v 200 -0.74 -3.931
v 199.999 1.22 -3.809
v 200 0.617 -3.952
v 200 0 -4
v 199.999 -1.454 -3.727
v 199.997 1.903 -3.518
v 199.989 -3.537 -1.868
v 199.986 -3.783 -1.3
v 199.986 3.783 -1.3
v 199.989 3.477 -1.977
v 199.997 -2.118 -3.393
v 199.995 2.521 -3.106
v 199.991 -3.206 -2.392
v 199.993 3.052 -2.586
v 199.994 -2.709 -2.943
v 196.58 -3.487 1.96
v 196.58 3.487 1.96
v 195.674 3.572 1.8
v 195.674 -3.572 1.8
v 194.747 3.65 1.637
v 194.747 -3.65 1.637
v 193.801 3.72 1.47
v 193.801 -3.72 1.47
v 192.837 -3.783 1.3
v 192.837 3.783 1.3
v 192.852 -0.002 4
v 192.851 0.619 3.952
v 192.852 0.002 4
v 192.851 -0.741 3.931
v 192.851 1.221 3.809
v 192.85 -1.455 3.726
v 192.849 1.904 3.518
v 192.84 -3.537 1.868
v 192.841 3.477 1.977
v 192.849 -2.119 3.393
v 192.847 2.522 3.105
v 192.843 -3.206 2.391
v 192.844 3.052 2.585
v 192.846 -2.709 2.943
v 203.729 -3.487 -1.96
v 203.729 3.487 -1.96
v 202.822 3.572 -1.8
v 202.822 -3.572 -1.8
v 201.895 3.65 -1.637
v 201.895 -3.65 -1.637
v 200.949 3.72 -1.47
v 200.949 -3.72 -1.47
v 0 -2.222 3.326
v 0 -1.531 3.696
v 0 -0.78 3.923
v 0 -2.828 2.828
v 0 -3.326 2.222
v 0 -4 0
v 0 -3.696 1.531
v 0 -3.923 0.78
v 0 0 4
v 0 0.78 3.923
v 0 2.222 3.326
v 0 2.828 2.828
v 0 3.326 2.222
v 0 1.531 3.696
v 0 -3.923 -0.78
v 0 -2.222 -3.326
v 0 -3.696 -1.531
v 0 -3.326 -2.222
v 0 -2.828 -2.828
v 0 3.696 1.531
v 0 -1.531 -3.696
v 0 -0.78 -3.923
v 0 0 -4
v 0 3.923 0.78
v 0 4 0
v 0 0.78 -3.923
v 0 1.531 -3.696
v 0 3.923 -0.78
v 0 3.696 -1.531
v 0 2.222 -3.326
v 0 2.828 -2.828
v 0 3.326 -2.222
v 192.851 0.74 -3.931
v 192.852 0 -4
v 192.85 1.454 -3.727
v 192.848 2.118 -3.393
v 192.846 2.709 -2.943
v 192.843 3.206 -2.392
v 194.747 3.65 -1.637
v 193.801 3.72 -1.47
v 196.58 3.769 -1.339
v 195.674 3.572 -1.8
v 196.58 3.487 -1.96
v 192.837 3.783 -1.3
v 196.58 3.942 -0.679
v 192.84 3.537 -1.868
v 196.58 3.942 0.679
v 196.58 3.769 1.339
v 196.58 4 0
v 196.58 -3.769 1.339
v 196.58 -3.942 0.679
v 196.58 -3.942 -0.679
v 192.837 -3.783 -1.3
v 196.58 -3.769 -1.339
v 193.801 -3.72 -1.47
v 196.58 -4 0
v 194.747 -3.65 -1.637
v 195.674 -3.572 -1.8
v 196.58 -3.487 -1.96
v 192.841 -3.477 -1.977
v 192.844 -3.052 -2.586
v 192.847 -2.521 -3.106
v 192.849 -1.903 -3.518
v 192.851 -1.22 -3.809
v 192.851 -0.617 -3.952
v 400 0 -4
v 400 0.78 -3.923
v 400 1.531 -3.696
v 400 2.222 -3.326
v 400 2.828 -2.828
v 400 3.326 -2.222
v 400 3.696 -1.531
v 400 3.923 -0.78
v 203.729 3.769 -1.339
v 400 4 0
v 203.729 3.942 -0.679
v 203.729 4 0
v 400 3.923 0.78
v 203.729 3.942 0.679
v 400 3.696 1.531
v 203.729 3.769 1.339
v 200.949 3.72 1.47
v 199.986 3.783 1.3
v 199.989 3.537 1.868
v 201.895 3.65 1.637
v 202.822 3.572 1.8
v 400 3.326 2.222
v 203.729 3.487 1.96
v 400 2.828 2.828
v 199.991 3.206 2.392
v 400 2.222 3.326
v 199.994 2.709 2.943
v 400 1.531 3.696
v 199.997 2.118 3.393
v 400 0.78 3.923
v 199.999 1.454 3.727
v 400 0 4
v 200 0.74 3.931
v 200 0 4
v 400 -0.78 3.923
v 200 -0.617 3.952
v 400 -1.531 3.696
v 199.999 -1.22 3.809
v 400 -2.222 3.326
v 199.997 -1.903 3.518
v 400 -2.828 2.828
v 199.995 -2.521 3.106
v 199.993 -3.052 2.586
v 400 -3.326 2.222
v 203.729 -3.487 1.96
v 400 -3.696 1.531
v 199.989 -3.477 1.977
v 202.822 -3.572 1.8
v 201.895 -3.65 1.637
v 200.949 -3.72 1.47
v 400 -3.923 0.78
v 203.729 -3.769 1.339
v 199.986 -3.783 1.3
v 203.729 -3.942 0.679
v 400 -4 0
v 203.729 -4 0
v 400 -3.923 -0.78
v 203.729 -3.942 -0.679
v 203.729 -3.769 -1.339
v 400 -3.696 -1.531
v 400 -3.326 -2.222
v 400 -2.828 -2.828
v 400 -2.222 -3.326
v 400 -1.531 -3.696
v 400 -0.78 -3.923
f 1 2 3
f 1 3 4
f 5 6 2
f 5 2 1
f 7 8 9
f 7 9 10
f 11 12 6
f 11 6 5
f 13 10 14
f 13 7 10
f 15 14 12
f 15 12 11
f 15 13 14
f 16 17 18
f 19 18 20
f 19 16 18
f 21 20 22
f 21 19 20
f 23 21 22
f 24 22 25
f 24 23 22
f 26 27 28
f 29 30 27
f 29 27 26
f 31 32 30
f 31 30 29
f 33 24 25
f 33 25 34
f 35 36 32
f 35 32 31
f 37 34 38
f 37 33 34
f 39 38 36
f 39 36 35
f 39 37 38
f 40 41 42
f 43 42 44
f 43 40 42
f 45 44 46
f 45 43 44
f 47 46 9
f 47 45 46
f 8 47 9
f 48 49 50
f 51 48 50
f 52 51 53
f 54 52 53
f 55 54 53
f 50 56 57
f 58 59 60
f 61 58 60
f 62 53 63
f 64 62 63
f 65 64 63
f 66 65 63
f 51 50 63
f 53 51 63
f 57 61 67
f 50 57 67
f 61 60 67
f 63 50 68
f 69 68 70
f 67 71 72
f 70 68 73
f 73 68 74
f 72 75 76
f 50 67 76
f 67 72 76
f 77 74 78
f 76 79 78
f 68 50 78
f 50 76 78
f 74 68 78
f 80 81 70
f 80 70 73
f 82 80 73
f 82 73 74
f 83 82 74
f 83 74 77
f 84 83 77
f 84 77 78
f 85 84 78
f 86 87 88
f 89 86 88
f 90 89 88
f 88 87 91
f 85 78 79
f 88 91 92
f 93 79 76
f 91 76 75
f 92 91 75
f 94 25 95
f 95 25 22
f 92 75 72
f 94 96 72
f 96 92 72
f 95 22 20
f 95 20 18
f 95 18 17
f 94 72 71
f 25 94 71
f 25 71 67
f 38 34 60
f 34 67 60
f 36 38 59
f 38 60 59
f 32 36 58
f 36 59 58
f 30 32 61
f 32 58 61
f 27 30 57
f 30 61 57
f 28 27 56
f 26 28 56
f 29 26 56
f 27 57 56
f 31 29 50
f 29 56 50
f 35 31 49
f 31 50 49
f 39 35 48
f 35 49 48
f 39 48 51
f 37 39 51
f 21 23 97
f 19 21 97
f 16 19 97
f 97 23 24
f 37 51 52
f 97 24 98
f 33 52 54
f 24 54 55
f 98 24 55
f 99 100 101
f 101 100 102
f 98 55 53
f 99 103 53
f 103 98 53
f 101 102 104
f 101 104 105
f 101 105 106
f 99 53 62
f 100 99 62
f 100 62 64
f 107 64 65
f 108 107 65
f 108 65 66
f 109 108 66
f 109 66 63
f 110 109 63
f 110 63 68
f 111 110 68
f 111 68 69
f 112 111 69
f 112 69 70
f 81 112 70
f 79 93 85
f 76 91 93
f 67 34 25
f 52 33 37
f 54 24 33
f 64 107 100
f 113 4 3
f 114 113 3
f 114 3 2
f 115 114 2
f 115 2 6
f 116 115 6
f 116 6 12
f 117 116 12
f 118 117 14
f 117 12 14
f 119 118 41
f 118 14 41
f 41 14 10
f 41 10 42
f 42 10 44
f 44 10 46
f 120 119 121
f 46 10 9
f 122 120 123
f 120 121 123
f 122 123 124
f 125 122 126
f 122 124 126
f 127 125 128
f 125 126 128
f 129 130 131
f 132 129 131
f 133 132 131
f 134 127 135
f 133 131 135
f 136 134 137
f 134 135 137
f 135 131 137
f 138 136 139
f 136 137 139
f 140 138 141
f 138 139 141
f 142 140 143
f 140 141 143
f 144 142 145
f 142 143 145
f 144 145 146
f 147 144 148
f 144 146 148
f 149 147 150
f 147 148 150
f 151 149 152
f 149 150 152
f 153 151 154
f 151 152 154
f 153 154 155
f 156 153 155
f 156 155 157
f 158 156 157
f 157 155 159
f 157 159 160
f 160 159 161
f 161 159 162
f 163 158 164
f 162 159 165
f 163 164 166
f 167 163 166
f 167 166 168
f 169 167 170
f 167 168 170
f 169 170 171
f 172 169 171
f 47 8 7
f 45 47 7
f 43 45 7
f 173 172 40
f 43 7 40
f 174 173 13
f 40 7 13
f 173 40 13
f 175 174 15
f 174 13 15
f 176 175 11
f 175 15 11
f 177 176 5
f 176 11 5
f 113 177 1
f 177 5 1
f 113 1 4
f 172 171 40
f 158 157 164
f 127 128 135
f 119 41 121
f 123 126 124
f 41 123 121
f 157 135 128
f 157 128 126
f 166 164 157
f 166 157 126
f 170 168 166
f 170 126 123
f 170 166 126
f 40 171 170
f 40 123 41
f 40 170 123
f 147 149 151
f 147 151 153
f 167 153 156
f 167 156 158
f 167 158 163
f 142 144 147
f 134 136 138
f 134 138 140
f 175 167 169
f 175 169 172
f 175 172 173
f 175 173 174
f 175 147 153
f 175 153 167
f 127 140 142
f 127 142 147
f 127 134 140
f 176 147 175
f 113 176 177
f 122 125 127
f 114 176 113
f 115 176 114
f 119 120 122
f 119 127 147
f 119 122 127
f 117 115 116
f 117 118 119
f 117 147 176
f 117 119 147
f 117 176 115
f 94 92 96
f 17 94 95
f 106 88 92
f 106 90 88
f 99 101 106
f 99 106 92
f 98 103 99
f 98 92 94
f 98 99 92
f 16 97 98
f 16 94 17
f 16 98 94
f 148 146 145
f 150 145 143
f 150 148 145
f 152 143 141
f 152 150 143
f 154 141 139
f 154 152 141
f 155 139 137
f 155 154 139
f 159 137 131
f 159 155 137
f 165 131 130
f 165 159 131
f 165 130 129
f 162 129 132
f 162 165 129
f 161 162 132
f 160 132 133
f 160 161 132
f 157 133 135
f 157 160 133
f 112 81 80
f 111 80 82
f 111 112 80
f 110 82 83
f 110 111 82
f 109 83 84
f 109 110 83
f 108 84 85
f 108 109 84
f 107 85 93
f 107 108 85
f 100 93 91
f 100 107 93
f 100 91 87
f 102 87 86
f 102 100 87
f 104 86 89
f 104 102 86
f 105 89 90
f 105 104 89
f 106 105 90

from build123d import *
from OCP.BRepAlgoAPI import BRepAlgoAPI_Cut
from OCP.TopTools import TopTools_ListOfShape

# Parameters (mm, degrees)
SKETCH1_R               = 4
BOSS_EXTRUDE1_DEPTH     = 400
CUT_EXTRUDE3_DEPTH      = 401.039998
CUT_EXTRUDE3_DEPTH_BACK = 401.039998


with BuildPart() as part:
    # Sketch1 → Boss-Extrude1 (new body)
    with BuildSketch(Plane(origin=(0, 0, 0), x_dir=(0, 0, -1), z_dir=(1, 0, 0))):
        Circle(SKETCH1_R)
    extrude(amount=BOSS_EXTRUDE1_DEPTH)


with BuildPart() as cut_extrude3_tool:
    # Sketch2 → Cut-Extrude3 (new, two sides: drawn at the far end of the back side and taken through both)
    with BuildSketch(Plane(origin=(0, 0, 0), x_dir=(1, 0, 0), z_dir=(0, 1, 0)).offset(-CUT_EXTRUDE3_DEPTH_BACK)):
        Polygon((199.985709439, 1.3), (200, 4), (192.851579286, 4.000000452), (192.837374297, 1.3), (196.580346974, 1.959987071), (196.580346974, -1.959987071), (192.837374297, -1.3), (192.851749918, -3.999999548), (200, -4), (199.985709439, -1.3), (203.728682116, -1.959987071), (203.728682116, 1.959987071), align=None)
    extrude(amount=CUT_EXTRUDE3_DEPTH + CUT_EXTRUDE3_DEPTH_BACK)


with BuildPart() as part_1:
    add(part.part)

    # Cut-Extrude3: cut by cut_extrude3_tool, with a tolerance
    cut_extrude3_stock = TopTools_ListOfShape()
    cut_extrude3_stock.Append(part_1.part.wrapped)
    cut_extrude3_tools = TopTools_ListOfShape()
    cut_extrude3_tools.Append(cut_extrude3_tool.part.wrapped)
    cut_extrude3_cut = BRepAlgoAPI_Cut()
    cut_extrude3_cut.SetArguments(cut_extrude3_stock)
    cut_extrude3_cut.SetTools(cut_extrude3_tools)
    cut_extrude3_cut.SetFuzzyValue(0.00001)
    cut_extrude3_cut.Build()
    add(Compound.cast(cut_extrude3_cut.Shape()).solids(), mode=Mode.REPLACE)


with BuildPart() as cut_extrude3_piece_1:
    # of the separate pieces the step leaves, piece 1, a body of its own (cut_extrude3_pieces)
    add(part_1.part.solids().sort_by_distance((199.985709439, 3.782856064, -1.3))[0])


with BuildPart() as cut_extrude3_piece_2:
    # of the separate pieces the step leaves, piece 2, a body of its own (cut_extrude3_pieces)
    add(part_1.part.solids().sort_by_distance((0, 0, -4))[0])


solid = Compound([cut_extrude3_piece_1.part, cut_extrude3_piece_2.part])
